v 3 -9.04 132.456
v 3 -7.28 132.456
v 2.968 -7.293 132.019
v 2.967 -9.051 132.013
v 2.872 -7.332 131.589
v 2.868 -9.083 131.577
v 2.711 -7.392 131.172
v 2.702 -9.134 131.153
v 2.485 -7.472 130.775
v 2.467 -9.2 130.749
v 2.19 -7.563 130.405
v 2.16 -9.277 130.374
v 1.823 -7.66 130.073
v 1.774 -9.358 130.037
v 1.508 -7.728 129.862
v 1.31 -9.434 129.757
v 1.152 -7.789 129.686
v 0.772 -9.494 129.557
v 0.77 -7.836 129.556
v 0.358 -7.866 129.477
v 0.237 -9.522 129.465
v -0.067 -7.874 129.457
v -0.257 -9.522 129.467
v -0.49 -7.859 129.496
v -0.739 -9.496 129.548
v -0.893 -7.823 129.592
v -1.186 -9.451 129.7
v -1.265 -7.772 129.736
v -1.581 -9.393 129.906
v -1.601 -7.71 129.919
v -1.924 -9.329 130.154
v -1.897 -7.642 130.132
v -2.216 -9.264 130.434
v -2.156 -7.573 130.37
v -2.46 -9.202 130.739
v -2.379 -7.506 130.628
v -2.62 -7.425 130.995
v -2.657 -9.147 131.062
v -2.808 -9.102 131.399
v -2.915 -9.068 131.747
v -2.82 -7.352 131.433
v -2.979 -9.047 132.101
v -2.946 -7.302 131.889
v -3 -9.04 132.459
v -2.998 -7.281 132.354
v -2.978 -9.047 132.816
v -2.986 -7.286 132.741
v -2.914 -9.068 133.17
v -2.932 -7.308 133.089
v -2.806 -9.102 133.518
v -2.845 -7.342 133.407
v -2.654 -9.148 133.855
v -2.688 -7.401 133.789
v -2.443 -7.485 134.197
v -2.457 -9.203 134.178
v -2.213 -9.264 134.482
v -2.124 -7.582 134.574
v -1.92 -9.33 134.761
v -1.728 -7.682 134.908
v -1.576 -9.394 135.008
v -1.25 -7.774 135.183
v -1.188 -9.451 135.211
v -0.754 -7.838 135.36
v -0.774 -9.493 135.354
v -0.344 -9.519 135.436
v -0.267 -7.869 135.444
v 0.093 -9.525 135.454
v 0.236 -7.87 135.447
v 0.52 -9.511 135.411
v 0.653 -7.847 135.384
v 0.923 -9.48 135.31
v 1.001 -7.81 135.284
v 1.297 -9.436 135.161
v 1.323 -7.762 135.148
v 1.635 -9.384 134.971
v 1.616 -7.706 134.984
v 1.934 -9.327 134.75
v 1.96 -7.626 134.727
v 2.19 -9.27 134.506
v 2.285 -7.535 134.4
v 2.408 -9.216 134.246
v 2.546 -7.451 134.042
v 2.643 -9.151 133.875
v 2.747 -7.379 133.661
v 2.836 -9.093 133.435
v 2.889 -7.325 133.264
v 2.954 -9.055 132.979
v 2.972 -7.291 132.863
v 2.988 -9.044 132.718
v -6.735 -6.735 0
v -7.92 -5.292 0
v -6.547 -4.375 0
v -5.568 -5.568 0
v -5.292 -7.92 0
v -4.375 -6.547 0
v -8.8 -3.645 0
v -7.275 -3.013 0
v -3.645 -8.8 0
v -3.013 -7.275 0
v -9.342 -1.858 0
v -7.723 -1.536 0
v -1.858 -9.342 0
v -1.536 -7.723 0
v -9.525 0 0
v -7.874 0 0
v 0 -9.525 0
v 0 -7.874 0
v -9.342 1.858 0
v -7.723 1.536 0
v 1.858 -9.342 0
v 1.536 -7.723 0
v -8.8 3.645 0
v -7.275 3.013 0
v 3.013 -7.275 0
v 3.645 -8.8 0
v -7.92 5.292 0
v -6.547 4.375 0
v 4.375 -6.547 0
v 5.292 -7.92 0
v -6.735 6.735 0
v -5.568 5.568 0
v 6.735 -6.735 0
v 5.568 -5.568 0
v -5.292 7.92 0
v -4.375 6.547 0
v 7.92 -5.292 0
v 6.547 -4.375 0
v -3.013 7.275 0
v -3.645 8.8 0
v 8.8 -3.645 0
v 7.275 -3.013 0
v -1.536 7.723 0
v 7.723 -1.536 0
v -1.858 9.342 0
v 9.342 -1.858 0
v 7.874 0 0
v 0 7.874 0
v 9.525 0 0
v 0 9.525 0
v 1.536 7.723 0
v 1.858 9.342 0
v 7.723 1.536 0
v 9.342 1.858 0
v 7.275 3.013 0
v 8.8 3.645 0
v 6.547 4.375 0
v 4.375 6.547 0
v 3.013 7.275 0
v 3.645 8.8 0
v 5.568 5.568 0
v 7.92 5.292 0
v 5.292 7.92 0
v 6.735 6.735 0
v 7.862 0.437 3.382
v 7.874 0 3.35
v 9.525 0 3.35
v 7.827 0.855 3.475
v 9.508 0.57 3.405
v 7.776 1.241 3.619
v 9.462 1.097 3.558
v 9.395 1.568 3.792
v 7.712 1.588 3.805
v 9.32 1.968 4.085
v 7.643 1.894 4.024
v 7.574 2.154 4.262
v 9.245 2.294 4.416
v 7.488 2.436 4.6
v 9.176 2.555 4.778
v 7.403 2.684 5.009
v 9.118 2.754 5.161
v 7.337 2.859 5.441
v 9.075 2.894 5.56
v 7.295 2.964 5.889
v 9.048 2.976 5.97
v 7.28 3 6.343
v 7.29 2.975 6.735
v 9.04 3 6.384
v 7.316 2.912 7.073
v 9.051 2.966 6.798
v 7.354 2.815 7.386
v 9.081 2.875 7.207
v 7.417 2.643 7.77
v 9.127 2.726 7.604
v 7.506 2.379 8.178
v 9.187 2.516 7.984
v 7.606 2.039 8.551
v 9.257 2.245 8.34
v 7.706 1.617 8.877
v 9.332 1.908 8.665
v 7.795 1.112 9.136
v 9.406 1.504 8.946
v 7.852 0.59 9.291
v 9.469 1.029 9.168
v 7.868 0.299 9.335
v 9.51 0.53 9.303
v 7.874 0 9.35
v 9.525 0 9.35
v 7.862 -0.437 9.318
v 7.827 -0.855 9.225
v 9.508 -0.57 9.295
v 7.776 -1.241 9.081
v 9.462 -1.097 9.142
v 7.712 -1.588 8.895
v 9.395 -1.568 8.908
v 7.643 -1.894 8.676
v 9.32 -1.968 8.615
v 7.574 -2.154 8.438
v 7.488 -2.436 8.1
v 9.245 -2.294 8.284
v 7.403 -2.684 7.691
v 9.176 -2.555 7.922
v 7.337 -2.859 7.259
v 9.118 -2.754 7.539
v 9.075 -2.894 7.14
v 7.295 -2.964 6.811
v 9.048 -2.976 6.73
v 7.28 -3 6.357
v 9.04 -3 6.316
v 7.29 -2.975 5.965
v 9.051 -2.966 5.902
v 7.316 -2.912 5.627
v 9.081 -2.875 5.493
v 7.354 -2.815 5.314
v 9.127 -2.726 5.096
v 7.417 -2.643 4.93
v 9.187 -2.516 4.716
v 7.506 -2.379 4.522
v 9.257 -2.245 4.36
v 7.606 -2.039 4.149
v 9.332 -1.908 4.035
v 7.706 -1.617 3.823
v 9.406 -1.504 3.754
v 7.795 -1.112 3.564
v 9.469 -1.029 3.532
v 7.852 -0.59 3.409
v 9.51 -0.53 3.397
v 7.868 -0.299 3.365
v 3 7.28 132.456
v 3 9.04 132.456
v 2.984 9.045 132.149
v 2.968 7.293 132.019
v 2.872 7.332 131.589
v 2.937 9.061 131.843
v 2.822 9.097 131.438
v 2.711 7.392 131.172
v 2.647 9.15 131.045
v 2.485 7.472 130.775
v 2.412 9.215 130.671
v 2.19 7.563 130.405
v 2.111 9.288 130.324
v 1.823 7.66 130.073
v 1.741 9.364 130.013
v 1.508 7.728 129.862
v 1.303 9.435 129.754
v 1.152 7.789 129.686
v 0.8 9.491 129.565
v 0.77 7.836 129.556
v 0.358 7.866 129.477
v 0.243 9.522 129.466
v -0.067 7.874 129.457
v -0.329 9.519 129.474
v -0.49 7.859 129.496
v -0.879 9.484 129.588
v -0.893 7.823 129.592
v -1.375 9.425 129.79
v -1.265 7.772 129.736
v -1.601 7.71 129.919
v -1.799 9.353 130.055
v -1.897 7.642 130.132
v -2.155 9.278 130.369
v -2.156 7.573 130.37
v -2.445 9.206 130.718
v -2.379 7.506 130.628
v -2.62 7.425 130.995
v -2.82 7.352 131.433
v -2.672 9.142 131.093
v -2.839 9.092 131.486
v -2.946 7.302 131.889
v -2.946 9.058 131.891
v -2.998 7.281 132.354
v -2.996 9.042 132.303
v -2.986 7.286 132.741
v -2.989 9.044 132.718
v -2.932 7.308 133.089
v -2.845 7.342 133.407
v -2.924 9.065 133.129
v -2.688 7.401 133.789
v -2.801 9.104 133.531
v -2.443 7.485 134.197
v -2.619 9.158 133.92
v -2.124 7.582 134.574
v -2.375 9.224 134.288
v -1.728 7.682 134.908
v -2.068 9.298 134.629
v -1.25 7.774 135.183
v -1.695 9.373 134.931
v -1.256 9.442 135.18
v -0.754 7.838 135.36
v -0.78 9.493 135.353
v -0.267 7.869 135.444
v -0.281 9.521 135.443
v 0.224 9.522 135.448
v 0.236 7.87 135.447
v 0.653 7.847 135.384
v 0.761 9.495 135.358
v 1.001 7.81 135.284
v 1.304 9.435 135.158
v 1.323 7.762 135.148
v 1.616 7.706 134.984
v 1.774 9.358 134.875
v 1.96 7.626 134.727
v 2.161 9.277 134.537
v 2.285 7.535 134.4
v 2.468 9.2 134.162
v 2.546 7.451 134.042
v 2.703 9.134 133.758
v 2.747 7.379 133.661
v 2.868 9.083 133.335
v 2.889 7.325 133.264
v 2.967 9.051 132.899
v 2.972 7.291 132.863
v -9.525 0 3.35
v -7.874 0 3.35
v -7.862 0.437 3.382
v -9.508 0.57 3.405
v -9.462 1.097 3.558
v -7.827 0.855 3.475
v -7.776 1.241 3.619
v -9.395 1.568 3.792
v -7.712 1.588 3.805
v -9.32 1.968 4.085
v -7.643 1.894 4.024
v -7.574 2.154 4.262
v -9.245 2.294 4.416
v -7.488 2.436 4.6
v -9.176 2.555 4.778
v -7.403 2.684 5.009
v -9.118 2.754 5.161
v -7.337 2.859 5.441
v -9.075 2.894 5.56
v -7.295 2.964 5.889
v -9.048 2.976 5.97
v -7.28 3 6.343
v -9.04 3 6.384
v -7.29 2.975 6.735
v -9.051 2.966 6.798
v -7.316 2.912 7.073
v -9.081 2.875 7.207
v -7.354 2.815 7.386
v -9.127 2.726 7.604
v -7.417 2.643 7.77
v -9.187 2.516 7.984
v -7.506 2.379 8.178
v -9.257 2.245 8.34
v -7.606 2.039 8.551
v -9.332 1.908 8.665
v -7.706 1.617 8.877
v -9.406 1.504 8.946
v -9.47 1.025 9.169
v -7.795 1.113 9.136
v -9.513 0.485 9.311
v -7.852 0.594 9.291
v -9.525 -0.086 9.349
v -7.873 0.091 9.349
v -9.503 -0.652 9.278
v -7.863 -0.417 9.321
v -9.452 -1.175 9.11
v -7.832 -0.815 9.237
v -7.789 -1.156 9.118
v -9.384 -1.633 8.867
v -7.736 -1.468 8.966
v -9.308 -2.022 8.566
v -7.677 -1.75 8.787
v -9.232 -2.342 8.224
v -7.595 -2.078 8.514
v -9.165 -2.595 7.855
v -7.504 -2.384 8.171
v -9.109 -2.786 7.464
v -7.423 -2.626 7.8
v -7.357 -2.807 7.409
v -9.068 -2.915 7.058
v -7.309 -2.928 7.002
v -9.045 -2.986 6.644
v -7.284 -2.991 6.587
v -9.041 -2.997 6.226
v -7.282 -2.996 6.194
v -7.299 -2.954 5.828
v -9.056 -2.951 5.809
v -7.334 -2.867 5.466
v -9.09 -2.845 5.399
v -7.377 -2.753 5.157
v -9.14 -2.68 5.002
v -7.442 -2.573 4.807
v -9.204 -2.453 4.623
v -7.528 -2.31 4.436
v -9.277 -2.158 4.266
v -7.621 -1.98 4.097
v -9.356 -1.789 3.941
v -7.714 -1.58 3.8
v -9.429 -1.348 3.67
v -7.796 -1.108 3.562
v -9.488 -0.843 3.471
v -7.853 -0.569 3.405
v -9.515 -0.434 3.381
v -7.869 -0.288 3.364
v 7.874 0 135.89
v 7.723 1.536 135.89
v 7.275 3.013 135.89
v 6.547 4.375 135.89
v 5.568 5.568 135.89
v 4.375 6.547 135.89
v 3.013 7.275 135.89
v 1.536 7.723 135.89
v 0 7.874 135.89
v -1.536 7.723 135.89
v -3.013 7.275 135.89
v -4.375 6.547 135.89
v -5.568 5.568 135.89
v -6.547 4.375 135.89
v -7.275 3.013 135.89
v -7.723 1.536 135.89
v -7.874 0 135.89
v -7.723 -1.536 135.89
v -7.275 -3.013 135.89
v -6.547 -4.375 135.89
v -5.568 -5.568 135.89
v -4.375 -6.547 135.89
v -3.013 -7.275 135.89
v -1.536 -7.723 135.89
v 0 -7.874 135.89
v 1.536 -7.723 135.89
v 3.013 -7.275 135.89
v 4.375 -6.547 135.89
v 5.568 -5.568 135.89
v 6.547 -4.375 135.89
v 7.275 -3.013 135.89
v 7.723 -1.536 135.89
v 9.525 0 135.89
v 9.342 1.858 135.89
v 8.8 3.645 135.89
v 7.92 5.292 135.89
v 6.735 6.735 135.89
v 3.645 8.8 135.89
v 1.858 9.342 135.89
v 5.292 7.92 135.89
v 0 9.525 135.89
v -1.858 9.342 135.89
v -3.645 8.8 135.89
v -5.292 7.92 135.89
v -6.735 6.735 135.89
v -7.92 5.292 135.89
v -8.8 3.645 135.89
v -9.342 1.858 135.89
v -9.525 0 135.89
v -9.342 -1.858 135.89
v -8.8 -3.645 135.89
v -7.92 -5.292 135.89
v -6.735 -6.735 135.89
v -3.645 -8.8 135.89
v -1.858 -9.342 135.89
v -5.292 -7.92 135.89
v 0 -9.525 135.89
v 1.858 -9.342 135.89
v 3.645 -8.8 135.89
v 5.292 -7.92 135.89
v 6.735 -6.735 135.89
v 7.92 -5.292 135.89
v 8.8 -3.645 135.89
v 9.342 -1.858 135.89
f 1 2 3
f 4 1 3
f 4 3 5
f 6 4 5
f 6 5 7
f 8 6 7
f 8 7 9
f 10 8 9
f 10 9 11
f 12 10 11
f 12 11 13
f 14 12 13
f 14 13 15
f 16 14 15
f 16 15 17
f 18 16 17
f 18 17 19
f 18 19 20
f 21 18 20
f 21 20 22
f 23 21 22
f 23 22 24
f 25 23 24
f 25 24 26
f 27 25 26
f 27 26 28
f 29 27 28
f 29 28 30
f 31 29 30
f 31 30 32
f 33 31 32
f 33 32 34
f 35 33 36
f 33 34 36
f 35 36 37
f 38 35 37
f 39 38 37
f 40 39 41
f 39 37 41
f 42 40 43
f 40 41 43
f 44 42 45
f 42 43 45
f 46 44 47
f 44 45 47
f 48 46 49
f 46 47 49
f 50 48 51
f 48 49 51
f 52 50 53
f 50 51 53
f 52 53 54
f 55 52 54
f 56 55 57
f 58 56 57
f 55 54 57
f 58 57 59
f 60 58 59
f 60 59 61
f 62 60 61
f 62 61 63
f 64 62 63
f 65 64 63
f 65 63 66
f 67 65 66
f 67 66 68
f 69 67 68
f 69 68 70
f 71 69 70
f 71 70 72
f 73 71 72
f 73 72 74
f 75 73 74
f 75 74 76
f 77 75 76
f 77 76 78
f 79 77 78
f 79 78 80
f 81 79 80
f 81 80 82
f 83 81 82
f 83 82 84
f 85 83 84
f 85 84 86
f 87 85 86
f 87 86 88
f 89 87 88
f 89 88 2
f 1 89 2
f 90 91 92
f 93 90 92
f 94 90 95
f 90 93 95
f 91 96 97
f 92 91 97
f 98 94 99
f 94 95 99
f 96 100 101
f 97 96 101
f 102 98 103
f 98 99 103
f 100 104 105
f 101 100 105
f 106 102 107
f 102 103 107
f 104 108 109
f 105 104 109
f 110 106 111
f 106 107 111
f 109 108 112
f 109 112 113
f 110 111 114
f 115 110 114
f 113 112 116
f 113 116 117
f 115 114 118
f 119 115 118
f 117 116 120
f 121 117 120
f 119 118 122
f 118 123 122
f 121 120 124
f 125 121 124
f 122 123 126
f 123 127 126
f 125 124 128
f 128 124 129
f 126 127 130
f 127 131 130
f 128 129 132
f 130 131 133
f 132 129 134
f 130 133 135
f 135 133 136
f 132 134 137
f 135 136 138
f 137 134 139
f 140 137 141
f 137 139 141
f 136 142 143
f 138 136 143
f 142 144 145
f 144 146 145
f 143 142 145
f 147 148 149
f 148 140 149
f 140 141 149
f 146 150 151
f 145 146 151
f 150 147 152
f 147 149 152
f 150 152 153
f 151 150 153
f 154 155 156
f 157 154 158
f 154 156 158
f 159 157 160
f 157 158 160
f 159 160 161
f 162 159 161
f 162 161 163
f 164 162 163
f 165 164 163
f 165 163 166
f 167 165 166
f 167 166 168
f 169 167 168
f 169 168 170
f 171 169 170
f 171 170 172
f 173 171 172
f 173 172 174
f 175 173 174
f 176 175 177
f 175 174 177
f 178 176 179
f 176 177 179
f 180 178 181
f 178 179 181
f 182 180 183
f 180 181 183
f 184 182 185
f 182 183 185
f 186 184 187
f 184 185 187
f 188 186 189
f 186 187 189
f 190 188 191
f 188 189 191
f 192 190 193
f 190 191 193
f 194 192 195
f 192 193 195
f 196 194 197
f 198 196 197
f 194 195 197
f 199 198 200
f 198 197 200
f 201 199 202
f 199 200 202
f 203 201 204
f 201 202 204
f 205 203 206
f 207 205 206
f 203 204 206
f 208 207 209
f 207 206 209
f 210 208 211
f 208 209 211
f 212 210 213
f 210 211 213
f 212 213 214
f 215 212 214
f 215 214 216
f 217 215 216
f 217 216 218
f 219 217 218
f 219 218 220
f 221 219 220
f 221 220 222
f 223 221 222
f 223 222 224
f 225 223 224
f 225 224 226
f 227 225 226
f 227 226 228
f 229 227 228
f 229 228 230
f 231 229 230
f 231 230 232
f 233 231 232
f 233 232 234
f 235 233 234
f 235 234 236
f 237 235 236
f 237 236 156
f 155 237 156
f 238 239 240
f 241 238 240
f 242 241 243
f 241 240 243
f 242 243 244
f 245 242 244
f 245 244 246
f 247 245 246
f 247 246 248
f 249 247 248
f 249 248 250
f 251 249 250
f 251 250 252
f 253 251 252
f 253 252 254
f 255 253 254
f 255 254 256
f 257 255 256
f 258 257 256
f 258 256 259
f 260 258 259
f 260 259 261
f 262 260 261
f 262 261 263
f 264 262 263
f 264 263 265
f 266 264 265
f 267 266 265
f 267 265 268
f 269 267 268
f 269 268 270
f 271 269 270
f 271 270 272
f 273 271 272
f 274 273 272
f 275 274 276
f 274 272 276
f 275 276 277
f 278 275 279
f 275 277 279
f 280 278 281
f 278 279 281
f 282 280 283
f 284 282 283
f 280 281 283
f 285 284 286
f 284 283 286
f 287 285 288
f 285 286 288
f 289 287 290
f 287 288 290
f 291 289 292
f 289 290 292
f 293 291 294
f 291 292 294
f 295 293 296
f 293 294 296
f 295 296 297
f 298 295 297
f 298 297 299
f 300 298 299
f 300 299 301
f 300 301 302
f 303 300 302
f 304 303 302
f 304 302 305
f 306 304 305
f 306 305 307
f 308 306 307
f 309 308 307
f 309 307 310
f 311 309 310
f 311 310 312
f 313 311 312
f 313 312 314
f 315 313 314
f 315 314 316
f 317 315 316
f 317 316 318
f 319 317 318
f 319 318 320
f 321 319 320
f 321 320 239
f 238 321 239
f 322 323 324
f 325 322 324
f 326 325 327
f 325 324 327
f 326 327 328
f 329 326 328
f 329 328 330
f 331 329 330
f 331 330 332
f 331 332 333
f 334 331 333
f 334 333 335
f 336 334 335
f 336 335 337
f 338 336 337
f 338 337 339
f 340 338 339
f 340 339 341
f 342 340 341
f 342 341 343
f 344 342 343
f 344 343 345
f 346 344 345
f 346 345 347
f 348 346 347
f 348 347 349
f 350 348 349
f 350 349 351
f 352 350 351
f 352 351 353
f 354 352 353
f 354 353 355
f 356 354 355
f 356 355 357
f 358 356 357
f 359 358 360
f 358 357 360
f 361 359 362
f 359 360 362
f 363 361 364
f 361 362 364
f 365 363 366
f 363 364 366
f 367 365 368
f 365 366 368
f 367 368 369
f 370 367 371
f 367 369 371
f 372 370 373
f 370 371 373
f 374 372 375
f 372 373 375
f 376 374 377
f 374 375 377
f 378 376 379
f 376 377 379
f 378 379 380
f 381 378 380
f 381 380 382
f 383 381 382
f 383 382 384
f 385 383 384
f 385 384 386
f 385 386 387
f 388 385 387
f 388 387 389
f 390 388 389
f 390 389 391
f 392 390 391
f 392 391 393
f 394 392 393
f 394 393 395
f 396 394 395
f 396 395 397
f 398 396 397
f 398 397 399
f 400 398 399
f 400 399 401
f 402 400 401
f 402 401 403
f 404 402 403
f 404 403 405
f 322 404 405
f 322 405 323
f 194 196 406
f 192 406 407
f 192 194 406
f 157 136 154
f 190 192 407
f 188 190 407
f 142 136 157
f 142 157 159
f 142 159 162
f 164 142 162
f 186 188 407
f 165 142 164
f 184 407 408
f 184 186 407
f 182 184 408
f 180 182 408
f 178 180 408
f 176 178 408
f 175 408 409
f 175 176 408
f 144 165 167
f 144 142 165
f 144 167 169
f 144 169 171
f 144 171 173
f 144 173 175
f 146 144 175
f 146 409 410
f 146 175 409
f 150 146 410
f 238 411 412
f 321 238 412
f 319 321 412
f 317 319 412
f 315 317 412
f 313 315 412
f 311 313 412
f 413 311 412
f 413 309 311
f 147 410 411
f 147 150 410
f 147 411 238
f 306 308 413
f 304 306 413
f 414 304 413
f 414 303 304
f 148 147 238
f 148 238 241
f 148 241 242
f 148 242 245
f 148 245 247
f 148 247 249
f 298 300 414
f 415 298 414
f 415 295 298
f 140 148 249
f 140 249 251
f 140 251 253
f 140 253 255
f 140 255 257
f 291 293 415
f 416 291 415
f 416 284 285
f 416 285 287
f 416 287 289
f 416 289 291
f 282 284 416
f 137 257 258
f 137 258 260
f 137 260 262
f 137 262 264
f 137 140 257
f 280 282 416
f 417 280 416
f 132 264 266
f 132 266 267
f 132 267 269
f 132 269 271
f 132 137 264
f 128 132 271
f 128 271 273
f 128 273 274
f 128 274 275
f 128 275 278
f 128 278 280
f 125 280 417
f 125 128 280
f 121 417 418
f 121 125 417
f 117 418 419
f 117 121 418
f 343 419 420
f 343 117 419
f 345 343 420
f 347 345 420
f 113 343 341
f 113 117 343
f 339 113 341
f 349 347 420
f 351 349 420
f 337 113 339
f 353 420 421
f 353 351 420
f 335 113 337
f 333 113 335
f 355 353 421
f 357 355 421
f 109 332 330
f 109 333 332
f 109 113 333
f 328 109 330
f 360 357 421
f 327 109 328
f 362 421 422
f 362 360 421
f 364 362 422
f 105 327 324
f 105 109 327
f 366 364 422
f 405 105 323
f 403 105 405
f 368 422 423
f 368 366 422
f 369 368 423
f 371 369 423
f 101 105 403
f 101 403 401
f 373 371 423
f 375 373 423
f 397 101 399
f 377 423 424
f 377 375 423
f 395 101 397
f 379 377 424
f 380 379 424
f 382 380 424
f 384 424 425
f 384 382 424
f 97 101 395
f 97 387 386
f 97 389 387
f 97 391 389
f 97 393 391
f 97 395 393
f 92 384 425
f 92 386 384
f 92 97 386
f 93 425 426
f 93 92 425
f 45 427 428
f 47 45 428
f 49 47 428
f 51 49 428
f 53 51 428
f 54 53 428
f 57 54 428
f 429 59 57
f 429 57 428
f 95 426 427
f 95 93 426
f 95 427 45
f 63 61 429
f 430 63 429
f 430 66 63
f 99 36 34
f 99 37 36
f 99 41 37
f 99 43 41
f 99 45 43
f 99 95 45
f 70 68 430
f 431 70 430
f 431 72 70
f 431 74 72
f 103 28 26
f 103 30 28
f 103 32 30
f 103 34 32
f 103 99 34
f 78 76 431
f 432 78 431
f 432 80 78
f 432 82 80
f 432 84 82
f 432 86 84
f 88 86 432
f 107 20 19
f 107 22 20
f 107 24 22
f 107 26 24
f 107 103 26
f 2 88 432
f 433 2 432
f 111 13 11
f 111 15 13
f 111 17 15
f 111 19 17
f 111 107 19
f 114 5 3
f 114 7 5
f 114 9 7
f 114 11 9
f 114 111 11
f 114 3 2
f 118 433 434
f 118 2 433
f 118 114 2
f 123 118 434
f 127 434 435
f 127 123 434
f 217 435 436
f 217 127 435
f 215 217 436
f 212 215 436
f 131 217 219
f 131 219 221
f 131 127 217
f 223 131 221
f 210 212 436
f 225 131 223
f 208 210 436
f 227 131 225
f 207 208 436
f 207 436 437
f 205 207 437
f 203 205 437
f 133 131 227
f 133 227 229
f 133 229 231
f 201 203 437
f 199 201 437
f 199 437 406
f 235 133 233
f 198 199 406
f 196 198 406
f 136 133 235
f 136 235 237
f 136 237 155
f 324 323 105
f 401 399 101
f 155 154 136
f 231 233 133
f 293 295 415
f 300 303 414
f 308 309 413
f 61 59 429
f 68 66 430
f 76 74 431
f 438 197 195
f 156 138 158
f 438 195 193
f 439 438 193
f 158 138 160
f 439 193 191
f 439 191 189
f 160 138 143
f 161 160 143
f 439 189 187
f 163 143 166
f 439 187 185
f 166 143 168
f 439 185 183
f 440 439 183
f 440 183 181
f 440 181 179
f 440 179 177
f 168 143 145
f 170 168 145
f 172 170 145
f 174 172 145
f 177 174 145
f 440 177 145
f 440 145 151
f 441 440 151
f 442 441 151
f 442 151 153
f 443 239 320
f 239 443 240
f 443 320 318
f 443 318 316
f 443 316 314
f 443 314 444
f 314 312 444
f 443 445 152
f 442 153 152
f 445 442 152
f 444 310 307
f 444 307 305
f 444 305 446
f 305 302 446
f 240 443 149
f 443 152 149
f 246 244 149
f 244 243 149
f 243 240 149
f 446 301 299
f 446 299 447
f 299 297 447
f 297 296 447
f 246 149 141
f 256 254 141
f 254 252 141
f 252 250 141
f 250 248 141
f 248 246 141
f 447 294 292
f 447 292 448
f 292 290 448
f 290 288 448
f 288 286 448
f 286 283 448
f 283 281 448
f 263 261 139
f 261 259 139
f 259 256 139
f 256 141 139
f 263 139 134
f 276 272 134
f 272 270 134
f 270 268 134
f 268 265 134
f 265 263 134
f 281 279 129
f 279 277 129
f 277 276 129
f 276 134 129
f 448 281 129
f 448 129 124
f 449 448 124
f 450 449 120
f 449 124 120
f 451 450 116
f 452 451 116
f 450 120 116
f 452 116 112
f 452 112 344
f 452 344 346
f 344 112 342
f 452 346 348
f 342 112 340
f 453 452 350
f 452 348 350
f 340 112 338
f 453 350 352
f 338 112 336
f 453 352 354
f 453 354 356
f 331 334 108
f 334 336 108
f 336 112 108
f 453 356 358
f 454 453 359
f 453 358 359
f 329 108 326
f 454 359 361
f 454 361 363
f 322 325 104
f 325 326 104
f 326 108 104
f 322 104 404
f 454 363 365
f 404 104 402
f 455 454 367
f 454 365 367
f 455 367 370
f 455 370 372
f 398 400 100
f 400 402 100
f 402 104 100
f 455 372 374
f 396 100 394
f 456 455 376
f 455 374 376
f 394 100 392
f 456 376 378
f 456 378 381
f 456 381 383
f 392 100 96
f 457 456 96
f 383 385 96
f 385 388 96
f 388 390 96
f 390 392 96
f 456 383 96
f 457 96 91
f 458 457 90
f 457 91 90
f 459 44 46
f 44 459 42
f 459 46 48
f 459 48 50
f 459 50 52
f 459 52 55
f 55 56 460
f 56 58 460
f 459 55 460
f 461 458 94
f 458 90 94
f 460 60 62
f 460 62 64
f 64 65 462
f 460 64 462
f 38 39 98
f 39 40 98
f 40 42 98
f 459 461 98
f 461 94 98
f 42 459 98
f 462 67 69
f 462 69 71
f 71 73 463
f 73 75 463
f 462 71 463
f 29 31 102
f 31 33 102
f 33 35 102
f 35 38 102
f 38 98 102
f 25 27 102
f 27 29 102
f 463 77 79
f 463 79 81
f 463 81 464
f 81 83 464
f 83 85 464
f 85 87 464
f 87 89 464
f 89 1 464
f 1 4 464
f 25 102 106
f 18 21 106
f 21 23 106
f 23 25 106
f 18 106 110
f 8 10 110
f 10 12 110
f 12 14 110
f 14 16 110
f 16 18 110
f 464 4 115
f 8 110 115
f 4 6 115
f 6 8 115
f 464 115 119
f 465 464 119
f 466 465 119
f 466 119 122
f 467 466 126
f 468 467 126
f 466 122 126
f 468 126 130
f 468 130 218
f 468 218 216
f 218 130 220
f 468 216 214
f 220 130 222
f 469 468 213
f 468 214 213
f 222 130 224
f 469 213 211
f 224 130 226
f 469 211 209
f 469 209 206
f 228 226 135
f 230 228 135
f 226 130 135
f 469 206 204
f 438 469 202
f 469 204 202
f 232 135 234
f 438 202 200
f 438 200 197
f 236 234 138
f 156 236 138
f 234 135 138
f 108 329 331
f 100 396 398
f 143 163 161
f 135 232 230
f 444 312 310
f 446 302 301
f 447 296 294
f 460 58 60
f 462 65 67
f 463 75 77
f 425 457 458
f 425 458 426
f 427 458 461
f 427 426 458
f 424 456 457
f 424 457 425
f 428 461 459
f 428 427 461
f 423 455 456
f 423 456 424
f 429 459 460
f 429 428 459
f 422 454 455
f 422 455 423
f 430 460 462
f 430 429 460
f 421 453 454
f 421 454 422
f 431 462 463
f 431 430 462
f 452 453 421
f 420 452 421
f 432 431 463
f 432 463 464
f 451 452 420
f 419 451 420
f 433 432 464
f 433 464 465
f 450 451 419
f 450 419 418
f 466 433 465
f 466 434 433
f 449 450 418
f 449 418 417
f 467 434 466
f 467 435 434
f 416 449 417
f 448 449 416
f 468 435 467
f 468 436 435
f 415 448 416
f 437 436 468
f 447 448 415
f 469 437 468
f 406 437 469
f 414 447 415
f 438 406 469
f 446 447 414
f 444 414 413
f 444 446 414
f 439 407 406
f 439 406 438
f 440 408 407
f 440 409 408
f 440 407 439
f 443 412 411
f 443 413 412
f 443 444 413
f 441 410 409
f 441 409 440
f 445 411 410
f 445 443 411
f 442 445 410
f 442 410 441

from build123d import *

# Parameters (mm, degrees)
SKETCH1_R           = 9.525
SKETCH1_R_2         = 7.874
BOSS_EXTRUDE1_DEPTH = 135.89
SKETCH2_R           = 3
CUT_EXTRUDE1_DEPTH  = 138.80592
SKETCH3_R           = 3
CUT_EXTRUDE2_DEPTH  = 138.80592


with BuildPart() as part:
    # Sketch1 → Boss-Extrude1 (new body)
    with BuildSketch(Plane.XY):
        Circle(SKETCH1_R)
        Circle(SKETCH1_R_2, mode=Mode.SUBTRACT)
    extrude(amount=BOSS_EXTRUDE1_DEPTH)

    # Sketch2 → Cut-Extrude1 (cut)
    with BuildSketch(Plane(origin=(0, 9.525, 0), x_dir=(1, 0, 0), z_dir=(0, 1, 0))):
        with Locations((0, -132.45592)):
            Circle(SKETCH2_R)
    extrude(amount=-CUT_EXTRUDE1_DEPTH, mode=Mode.SUBTRACT)

    # Sketch3 → Cut-Extrude2 (cut)
    with BuildSketch(Plane(origin=(9.525, 0, 0), x_dir=(0, 0, -1), z_dir=(1, 0, 0))):
        with Locations((-6.35, 0)):
            Circle(SKETCH3_R)
    extrude(amount=-CUT_EXTRUDE2_DEPTH, mode=Mode.SUBTRACT)


solid = part.part
